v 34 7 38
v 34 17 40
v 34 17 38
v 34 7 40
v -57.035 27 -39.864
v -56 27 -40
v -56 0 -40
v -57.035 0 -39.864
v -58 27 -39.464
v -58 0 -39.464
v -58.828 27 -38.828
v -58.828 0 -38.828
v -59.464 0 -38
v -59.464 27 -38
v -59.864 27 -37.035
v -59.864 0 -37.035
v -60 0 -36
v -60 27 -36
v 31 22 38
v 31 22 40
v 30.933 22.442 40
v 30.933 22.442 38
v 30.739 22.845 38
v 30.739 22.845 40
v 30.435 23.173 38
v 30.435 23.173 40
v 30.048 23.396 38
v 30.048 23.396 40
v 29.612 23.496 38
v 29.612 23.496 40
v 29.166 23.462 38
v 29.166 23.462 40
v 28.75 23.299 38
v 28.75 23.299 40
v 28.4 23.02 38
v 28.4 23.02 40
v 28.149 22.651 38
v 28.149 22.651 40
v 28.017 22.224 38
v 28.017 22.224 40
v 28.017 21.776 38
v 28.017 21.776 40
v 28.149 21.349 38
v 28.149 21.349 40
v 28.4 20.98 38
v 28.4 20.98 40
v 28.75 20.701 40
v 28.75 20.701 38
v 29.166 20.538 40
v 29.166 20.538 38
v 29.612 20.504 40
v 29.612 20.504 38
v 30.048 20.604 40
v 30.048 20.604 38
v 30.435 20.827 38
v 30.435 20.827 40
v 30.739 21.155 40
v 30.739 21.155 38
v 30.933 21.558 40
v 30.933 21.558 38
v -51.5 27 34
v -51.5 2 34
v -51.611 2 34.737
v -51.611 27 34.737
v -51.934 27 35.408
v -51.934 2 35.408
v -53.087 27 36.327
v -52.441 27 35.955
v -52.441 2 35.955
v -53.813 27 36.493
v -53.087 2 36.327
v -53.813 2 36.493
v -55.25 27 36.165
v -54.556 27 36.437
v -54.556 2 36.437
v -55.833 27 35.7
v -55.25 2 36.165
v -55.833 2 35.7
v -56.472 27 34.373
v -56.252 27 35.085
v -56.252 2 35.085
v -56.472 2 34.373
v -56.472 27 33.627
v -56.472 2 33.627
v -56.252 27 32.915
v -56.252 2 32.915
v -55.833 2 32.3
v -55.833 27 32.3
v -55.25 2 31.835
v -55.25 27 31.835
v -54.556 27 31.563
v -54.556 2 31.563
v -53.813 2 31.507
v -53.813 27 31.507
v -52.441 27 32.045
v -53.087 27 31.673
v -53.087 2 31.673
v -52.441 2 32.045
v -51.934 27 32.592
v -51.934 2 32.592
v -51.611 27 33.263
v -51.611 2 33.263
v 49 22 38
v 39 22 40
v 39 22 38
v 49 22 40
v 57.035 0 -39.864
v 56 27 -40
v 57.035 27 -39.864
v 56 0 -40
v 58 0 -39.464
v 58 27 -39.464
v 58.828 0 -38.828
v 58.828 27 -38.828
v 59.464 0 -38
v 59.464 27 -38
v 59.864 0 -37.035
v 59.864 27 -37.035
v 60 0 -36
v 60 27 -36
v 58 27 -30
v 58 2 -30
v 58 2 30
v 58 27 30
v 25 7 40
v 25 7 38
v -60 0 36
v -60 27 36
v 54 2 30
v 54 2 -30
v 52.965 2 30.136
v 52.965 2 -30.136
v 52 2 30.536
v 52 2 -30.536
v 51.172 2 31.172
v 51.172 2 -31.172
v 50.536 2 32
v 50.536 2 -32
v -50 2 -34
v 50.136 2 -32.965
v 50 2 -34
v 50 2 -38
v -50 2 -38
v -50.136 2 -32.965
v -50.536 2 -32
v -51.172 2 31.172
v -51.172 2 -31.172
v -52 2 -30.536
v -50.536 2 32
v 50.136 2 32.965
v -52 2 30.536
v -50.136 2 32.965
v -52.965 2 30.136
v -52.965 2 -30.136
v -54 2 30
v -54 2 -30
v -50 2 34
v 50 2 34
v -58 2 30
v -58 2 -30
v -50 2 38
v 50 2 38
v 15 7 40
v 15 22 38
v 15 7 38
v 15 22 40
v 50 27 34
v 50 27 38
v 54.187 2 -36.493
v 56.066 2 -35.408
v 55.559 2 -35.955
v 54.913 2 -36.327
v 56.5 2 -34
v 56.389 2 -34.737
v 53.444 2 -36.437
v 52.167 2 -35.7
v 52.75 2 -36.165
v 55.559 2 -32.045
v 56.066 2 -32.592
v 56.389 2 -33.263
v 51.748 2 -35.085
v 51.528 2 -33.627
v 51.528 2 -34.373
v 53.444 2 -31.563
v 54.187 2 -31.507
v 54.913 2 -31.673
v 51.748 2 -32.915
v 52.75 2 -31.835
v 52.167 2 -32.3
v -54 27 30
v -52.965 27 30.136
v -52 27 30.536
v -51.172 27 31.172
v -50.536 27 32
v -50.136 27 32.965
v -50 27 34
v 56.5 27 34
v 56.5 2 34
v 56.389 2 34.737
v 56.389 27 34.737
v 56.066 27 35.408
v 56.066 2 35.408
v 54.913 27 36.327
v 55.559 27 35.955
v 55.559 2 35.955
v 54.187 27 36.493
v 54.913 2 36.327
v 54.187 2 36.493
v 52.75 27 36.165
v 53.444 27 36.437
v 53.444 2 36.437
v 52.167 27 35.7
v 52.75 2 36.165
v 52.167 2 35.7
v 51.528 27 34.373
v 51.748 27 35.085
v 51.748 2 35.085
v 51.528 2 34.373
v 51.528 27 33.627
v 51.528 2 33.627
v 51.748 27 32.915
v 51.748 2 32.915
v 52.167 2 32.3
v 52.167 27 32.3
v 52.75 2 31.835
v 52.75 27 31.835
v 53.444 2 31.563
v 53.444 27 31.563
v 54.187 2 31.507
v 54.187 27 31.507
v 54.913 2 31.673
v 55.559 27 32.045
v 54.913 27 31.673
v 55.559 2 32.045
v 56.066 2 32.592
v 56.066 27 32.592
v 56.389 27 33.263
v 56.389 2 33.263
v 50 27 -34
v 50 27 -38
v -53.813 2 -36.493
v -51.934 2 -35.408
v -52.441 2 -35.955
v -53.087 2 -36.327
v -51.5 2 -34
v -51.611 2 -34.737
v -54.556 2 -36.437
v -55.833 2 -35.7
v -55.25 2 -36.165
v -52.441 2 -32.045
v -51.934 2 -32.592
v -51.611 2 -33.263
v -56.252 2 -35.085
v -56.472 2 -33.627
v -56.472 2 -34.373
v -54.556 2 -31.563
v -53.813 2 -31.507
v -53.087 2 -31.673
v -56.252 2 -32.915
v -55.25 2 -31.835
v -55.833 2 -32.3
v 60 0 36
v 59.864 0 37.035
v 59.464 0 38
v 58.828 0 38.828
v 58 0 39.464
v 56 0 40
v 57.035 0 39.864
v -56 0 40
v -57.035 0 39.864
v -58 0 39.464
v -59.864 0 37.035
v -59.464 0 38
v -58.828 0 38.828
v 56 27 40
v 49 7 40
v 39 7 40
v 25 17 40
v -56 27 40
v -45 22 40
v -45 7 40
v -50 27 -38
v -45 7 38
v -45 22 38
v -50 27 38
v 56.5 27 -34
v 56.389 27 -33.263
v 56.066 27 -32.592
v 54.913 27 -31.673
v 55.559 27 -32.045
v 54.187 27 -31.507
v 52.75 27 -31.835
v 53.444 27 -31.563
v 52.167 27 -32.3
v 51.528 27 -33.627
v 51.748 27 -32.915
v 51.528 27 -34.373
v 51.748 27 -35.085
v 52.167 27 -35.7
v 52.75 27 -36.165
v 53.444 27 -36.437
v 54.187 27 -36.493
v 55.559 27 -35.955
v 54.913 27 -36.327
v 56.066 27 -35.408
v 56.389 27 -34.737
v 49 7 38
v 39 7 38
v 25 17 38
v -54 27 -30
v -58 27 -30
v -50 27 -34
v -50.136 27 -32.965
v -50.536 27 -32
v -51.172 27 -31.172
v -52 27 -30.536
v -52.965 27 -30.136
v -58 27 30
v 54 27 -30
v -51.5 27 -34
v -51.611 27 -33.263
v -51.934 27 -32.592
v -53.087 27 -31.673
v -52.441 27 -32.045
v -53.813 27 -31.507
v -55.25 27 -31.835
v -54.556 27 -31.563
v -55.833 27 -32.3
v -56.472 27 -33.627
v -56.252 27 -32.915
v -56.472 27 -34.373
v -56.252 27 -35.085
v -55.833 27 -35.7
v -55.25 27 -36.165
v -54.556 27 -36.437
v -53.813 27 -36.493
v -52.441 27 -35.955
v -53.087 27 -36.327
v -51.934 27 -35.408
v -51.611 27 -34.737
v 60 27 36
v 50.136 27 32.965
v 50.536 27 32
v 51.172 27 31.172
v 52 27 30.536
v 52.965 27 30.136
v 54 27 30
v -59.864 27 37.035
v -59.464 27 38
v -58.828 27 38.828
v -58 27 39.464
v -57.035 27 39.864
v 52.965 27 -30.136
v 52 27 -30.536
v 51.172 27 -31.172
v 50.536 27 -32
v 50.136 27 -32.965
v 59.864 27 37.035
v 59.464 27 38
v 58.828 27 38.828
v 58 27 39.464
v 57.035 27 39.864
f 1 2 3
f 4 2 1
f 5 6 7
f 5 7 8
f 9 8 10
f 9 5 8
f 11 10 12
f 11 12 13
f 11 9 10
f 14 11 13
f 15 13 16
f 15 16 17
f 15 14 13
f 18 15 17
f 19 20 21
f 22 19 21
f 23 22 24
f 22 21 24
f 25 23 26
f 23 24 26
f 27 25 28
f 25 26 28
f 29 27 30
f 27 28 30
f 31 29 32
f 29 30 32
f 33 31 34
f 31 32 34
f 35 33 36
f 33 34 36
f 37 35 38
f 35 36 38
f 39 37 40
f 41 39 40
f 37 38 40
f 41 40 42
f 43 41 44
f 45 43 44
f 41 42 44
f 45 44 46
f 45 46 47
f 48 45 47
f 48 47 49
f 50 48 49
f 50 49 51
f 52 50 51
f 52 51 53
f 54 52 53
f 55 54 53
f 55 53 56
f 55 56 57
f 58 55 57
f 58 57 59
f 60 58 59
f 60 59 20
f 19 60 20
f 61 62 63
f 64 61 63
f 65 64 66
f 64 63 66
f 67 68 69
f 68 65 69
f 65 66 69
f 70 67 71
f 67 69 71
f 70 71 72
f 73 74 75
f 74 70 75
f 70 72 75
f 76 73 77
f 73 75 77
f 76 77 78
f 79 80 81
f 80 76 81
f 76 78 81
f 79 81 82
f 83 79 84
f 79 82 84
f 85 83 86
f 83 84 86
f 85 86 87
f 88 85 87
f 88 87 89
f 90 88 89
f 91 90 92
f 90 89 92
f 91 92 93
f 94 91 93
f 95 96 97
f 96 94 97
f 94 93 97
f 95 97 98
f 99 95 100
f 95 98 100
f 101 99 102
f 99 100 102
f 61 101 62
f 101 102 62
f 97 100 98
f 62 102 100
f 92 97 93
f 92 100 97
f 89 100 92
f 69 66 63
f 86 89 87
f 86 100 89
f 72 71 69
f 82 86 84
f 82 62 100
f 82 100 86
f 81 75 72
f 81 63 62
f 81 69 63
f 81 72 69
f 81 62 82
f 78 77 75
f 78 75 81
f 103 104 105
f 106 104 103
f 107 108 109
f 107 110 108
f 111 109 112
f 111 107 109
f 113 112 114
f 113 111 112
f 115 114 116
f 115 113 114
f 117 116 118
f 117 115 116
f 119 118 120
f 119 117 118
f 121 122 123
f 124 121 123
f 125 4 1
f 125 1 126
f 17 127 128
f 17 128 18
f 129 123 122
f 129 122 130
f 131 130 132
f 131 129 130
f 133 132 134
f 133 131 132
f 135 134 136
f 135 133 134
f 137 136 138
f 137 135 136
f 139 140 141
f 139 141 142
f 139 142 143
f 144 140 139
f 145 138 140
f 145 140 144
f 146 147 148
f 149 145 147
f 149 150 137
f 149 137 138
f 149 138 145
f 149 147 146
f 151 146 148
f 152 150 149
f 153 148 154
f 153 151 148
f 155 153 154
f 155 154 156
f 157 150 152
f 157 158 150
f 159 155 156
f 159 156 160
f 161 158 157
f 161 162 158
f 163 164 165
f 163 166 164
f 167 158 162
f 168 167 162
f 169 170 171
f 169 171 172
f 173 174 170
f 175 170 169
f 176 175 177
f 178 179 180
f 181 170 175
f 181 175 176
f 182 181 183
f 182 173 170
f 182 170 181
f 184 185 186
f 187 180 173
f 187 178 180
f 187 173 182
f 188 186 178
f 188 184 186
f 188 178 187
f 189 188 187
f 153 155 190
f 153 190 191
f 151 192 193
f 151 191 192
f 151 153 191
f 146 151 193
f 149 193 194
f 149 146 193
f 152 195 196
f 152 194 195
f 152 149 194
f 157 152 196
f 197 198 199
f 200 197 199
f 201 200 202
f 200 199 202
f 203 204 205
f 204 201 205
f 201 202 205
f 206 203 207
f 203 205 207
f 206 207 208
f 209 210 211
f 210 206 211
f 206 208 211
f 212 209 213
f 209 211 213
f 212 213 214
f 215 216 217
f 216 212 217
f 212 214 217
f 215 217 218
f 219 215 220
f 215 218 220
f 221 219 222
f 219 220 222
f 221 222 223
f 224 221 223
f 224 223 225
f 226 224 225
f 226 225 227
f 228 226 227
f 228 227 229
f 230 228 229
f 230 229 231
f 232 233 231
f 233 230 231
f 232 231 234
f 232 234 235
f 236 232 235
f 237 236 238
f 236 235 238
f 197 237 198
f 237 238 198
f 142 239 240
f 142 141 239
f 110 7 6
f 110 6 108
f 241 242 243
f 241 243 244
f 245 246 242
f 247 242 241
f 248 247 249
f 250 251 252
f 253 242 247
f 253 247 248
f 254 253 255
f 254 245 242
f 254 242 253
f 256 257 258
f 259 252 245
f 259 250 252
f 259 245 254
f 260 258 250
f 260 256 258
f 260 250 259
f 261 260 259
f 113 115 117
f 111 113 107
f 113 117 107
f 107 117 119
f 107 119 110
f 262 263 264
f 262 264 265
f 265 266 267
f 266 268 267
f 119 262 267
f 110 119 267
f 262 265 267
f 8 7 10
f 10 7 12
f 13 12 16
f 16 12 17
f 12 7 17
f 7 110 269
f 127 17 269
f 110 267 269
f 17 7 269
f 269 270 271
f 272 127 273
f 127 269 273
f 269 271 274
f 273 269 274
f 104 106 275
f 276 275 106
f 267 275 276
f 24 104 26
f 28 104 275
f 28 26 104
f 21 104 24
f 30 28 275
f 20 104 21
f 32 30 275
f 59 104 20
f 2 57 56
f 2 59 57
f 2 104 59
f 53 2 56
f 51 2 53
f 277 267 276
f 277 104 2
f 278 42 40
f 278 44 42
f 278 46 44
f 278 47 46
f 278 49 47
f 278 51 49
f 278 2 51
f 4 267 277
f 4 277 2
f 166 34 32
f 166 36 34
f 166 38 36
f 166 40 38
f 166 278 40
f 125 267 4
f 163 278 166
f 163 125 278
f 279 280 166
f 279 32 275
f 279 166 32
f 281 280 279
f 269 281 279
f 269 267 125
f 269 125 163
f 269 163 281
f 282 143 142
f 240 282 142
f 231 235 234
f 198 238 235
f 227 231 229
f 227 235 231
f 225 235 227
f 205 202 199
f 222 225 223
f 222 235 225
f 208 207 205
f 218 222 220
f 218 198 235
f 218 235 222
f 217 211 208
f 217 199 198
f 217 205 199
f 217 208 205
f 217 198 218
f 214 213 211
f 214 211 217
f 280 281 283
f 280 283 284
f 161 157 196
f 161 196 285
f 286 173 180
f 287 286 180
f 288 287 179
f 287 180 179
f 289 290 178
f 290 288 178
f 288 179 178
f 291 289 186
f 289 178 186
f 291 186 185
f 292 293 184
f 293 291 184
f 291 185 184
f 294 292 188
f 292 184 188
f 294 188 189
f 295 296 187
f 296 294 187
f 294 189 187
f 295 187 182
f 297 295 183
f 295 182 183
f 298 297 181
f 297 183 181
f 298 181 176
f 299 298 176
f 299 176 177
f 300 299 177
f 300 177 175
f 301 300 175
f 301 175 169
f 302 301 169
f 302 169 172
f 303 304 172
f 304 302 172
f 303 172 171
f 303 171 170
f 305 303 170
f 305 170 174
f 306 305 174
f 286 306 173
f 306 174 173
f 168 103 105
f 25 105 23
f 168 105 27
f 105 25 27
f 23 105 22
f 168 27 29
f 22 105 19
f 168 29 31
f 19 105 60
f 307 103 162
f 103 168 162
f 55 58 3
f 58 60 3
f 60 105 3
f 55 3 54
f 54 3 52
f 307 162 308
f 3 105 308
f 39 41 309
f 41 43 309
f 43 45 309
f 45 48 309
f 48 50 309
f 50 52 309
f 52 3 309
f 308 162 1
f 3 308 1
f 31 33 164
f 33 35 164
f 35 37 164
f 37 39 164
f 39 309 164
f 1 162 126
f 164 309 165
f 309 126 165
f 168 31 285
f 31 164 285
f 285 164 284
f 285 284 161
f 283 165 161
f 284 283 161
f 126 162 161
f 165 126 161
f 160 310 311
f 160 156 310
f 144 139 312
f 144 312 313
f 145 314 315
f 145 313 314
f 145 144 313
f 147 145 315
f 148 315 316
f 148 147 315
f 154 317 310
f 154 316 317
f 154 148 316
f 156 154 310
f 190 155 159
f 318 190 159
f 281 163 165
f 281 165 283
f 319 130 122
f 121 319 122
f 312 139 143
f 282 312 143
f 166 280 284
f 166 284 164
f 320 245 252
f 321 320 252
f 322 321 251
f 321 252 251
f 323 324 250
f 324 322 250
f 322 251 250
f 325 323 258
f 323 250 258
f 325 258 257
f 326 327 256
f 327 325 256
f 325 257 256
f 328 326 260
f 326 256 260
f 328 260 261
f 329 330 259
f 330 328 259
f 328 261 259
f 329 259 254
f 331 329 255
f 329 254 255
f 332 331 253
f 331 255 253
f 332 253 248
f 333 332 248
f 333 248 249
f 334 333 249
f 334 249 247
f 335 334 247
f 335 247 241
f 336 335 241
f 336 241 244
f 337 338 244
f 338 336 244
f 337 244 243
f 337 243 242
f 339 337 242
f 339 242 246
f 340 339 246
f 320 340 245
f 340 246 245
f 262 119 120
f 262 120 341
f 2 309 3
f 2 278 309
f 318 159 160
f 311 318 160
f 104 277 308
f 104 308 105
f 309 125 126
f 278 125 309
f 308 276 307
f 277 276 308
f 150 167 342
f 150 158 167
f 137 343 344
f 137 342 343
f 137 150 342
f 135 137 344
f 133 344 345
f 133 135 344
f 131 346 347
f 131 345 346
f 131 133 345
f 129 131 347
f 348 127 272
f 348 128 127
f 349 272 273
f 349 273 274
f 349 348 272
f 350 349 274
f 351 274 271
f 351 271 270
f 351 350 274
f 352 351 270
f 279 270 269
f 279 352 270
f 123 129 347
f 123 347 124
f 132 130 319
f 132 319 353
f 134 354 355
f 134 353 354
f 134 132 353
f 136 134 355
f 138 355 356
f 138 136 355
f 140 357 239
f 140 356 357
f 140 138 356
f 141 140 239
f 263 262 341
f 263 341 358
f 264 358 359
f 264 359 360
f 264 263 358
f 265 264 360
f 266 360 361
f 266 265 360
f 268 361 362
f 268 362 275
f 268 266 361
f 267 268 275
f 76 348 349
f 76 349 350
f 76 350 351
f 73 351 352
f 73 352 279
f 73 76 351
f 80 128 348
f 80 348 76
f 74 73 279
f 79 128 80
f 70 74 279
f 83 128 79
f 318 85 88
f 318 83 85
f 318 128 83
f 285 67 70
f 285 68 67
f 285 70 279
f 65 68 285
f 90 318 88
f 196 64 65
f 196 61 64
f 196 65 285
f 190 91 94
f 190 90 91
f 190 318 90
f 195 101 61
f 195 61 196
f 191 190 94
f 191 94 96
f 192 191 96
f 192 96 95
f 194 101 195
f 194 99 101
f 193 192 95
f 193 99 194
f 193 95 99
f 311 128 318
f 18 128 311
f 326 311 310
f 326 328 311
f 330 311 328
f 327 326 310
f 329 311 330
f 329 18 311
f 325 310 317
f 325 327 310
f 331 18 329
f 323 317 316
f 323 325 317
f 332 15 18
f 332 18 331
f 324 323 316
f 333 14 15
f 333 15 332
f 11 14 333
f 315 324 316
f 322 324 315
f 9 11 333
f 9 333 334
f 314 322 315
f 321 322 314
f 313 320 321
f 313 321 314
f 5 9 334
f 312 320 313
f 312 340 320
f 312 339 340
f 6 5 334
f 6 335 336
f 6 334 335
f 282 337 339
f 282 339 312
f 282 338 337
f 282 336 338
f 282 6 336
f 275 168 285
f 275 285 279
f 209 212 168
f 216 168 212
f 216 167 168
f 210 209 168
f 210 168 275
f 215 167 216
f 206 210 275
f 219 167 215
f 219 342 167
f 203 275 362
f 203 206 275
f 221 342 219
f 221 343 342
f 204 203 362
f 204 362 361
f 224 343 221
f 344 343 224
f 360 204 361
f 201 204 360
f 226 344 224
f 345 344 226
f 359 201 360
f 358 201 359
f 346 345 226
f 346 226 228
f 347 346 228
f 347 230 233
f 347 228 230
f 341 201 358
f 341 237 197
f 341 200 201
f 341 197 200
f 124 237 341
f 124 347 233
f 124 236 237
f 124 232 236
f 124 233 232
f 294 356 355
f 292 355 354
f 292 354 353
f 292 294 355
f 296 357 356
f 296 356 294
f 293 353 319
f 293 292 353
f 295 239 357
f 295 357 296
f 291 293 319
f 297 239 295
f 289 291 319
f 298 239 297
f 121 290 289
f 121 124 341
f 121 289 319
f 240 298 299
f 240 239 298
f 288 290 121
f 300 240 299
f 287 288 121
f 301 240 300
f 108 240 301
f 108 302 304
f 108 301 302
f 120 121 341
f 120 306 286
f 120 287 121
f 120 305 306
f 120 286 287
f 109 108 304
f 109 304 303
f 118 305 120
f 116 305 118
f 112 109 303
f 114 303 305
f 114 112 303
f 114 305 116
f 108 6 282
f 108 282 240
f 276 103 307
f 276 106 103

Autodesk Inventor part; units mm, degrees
ref_plane "YZ Plane" through (0, 0, 0) normal (1, 0, 0) x (0, 1, 0)
ref_plane "XZ Plane" through (0, 0, 0) normal (0, 1, 0) x (-1, 0, 0)
ref_plane "XY Plane" through (0, 0, 0) normal (0, 0, 1) x (1, 0, 0)
sketch "Sketch1" plane through (0, 0, 0) normal (0, 1, 0) x (-1, 0, 0)
  line L0 (60, -40) -> (-60, -40)
  line L1 (-60, -40) -> (-60, 40)
  line L2 (-60, 40) -> (60, 40)
  line L3 (60, 40) -> (60, -40)
  point P0 (0, 0)
  dimension "d0" = 80
  dimension "d1" = 120
  dimension "d2" = 40
  dimension "d3" = 60
extrude "Extrusion1" add sketch "Sketch1" along normal blind 2
sketch "Sketch2" plane through (0, 2, 0) normal (0, 1, 0) x (1, 0, 0)
  line L0 (60, 40) -> (-60, 40) projected
  line L1 (60, -40) -> (60, 40) projected
  line L2 (-60, 40) -> (60, 40)
  line L3 (60, 40) -> (60, -40)
  line L4 (60, -40) -> (-60, -40)
  line L5 (-60, -40) -> (-60, 40)
  line L6 (-58, 38) -> (58, 38)
  line L7 (58, 38) -> (58, -38)
  line L8 (58, -38) -> (-58, -38)
  line L9 (-58, -38) -> (-58, 38)
  arc A0 (-50, -34) -> (-54, -30) centre (-54, -34) ccw
  line L10 (-54, -30) -> (-58, -30)
  line L11 (-50, -34) -> (-50, -38)
  line L12 (0, 4.5233) -> (0, -3.3512)
  line L13 (-2.8256, 0) -> (3.7968, 0)
  arc A1 (-54, 30) -> (-50, 34) centre (-54, 34) ccw
  line L14 (-54, 30) -> (-58, 30)
  line L15 (-50, 34) -> (-50, 38)
  arc A2 (54, -30) -> (50, -34) centre (54, -34) ccw
  line L16 (54, -30) -> (58, -30)
  line L17 (50, -34) -> (50, -38)
  line L18 (54, 30) -> (58, 30)
  arc A3 (50, 34) -> (54, 30) centre (54, 34) ccw
  line L19 (50, 34) -> (50, 38)
  circle A4 centre (-54, -34) radius 2.5
  circle A5 centre (-54, 34) radius 2.5
  circle A6 centre (54, -34) radius 2.5
  circle A7 centre (54, 34) radius 2.5
  point P0 (0, 0)
  dimension "d6" = 2
  dimension "d7" = 2
  dimension "d8" = 2
  dimension "d9" = 2
  dimension "d29" = 8
  dimension "d30" = 4
  dimension "d31" = 4
  dimension "d32" = 5
  dimension "d35" = 68
  dimension "d38" = 108
extrude "Extrusion2" add sketch "Sketch2" along normal blind 25 contours L1 L4 L5 L0 | L6 L15 A1 L14 L9 | L6 L7 L18 A3 L19 | L10 A0 L11 L8 L9 | L7 L8 L17 A2 L16
sketch "Sketch3" plane through (-60, 0, 40) normal (0, 0, 1) x (1, 0, 0)
  line L0 (15, 22) -> (75, 22)
  line L1 (75, 22) -> (75, 7)
  line L2 (75, 7) -> (15, 7)
  line L3 (15, 7) -> (15, 22)
  line L4 (10, 2) -> (110, 2) projected
  line L5 (0, 0) -> (0, 27) projected
  line L6 (85, 17) -> (94, 17)
  line L7 (94, 17) -> (94, 7)
  line L8 (94, 7) -> (85, 7)
  line L9 (85, 7) -> (85, 17)
  line L10 (99, 22) -> (109, 22)
  line L11 (109, 22) -> (109, 7)
  line L12 (109, 7) -> (99, 7)
  line L13 (99, 7) -> (99, 22)
  circle A0 centre (89.5, 22) radius 1.5
  point P0 (60, 0)
  point P1 (2, 2)
  point P2 (118, 2)
  point P3 (89.5, 7)
  point P4 (89.5, 17)
  dimension "d12" = 60
  dimension "d13" = 15
  dimension "d14" = 5
  dimension "d15" = 15
  dimension "d16" = 9
  dimension "d17" = 10
  dimension "d18" = 10
  dimension "d19" = 5
  dimension "d20" = 10
  dimension "d21" = 15
  dimension "d22" = 5
  dimension "d23" = 5
  dimension "d24" = 3
  dimension "d25" = 5
  dimension "d26" = 4.5
extrude "Extrusion3" cut sketch "Sketch3" against normal blind 25
fillet "Fillet1" radius 4 4 edges at (-60, 13.5, 40) (60, 13.5, 40) (60, 13.5, -40) (-60, 13.5, -40)
equation "\"d0\" = 0.666667 * d1"
equation "\"d2\" = 0.5 * d0"
equation "\"d3\" = 0.5 * d1"
equation "\"d7\" = d6"
equation "\"d8\" = d6"
equation "\"d9\" = d6"
equation "\"d30\" = 0.5 * d29"
equation "\"d31\" = d30"
equation "\"d19\" = d14"
equation "\"d22\" = d19"
equation "\"d26\" = 0.5 * d16"
properties part number "housing_base"
